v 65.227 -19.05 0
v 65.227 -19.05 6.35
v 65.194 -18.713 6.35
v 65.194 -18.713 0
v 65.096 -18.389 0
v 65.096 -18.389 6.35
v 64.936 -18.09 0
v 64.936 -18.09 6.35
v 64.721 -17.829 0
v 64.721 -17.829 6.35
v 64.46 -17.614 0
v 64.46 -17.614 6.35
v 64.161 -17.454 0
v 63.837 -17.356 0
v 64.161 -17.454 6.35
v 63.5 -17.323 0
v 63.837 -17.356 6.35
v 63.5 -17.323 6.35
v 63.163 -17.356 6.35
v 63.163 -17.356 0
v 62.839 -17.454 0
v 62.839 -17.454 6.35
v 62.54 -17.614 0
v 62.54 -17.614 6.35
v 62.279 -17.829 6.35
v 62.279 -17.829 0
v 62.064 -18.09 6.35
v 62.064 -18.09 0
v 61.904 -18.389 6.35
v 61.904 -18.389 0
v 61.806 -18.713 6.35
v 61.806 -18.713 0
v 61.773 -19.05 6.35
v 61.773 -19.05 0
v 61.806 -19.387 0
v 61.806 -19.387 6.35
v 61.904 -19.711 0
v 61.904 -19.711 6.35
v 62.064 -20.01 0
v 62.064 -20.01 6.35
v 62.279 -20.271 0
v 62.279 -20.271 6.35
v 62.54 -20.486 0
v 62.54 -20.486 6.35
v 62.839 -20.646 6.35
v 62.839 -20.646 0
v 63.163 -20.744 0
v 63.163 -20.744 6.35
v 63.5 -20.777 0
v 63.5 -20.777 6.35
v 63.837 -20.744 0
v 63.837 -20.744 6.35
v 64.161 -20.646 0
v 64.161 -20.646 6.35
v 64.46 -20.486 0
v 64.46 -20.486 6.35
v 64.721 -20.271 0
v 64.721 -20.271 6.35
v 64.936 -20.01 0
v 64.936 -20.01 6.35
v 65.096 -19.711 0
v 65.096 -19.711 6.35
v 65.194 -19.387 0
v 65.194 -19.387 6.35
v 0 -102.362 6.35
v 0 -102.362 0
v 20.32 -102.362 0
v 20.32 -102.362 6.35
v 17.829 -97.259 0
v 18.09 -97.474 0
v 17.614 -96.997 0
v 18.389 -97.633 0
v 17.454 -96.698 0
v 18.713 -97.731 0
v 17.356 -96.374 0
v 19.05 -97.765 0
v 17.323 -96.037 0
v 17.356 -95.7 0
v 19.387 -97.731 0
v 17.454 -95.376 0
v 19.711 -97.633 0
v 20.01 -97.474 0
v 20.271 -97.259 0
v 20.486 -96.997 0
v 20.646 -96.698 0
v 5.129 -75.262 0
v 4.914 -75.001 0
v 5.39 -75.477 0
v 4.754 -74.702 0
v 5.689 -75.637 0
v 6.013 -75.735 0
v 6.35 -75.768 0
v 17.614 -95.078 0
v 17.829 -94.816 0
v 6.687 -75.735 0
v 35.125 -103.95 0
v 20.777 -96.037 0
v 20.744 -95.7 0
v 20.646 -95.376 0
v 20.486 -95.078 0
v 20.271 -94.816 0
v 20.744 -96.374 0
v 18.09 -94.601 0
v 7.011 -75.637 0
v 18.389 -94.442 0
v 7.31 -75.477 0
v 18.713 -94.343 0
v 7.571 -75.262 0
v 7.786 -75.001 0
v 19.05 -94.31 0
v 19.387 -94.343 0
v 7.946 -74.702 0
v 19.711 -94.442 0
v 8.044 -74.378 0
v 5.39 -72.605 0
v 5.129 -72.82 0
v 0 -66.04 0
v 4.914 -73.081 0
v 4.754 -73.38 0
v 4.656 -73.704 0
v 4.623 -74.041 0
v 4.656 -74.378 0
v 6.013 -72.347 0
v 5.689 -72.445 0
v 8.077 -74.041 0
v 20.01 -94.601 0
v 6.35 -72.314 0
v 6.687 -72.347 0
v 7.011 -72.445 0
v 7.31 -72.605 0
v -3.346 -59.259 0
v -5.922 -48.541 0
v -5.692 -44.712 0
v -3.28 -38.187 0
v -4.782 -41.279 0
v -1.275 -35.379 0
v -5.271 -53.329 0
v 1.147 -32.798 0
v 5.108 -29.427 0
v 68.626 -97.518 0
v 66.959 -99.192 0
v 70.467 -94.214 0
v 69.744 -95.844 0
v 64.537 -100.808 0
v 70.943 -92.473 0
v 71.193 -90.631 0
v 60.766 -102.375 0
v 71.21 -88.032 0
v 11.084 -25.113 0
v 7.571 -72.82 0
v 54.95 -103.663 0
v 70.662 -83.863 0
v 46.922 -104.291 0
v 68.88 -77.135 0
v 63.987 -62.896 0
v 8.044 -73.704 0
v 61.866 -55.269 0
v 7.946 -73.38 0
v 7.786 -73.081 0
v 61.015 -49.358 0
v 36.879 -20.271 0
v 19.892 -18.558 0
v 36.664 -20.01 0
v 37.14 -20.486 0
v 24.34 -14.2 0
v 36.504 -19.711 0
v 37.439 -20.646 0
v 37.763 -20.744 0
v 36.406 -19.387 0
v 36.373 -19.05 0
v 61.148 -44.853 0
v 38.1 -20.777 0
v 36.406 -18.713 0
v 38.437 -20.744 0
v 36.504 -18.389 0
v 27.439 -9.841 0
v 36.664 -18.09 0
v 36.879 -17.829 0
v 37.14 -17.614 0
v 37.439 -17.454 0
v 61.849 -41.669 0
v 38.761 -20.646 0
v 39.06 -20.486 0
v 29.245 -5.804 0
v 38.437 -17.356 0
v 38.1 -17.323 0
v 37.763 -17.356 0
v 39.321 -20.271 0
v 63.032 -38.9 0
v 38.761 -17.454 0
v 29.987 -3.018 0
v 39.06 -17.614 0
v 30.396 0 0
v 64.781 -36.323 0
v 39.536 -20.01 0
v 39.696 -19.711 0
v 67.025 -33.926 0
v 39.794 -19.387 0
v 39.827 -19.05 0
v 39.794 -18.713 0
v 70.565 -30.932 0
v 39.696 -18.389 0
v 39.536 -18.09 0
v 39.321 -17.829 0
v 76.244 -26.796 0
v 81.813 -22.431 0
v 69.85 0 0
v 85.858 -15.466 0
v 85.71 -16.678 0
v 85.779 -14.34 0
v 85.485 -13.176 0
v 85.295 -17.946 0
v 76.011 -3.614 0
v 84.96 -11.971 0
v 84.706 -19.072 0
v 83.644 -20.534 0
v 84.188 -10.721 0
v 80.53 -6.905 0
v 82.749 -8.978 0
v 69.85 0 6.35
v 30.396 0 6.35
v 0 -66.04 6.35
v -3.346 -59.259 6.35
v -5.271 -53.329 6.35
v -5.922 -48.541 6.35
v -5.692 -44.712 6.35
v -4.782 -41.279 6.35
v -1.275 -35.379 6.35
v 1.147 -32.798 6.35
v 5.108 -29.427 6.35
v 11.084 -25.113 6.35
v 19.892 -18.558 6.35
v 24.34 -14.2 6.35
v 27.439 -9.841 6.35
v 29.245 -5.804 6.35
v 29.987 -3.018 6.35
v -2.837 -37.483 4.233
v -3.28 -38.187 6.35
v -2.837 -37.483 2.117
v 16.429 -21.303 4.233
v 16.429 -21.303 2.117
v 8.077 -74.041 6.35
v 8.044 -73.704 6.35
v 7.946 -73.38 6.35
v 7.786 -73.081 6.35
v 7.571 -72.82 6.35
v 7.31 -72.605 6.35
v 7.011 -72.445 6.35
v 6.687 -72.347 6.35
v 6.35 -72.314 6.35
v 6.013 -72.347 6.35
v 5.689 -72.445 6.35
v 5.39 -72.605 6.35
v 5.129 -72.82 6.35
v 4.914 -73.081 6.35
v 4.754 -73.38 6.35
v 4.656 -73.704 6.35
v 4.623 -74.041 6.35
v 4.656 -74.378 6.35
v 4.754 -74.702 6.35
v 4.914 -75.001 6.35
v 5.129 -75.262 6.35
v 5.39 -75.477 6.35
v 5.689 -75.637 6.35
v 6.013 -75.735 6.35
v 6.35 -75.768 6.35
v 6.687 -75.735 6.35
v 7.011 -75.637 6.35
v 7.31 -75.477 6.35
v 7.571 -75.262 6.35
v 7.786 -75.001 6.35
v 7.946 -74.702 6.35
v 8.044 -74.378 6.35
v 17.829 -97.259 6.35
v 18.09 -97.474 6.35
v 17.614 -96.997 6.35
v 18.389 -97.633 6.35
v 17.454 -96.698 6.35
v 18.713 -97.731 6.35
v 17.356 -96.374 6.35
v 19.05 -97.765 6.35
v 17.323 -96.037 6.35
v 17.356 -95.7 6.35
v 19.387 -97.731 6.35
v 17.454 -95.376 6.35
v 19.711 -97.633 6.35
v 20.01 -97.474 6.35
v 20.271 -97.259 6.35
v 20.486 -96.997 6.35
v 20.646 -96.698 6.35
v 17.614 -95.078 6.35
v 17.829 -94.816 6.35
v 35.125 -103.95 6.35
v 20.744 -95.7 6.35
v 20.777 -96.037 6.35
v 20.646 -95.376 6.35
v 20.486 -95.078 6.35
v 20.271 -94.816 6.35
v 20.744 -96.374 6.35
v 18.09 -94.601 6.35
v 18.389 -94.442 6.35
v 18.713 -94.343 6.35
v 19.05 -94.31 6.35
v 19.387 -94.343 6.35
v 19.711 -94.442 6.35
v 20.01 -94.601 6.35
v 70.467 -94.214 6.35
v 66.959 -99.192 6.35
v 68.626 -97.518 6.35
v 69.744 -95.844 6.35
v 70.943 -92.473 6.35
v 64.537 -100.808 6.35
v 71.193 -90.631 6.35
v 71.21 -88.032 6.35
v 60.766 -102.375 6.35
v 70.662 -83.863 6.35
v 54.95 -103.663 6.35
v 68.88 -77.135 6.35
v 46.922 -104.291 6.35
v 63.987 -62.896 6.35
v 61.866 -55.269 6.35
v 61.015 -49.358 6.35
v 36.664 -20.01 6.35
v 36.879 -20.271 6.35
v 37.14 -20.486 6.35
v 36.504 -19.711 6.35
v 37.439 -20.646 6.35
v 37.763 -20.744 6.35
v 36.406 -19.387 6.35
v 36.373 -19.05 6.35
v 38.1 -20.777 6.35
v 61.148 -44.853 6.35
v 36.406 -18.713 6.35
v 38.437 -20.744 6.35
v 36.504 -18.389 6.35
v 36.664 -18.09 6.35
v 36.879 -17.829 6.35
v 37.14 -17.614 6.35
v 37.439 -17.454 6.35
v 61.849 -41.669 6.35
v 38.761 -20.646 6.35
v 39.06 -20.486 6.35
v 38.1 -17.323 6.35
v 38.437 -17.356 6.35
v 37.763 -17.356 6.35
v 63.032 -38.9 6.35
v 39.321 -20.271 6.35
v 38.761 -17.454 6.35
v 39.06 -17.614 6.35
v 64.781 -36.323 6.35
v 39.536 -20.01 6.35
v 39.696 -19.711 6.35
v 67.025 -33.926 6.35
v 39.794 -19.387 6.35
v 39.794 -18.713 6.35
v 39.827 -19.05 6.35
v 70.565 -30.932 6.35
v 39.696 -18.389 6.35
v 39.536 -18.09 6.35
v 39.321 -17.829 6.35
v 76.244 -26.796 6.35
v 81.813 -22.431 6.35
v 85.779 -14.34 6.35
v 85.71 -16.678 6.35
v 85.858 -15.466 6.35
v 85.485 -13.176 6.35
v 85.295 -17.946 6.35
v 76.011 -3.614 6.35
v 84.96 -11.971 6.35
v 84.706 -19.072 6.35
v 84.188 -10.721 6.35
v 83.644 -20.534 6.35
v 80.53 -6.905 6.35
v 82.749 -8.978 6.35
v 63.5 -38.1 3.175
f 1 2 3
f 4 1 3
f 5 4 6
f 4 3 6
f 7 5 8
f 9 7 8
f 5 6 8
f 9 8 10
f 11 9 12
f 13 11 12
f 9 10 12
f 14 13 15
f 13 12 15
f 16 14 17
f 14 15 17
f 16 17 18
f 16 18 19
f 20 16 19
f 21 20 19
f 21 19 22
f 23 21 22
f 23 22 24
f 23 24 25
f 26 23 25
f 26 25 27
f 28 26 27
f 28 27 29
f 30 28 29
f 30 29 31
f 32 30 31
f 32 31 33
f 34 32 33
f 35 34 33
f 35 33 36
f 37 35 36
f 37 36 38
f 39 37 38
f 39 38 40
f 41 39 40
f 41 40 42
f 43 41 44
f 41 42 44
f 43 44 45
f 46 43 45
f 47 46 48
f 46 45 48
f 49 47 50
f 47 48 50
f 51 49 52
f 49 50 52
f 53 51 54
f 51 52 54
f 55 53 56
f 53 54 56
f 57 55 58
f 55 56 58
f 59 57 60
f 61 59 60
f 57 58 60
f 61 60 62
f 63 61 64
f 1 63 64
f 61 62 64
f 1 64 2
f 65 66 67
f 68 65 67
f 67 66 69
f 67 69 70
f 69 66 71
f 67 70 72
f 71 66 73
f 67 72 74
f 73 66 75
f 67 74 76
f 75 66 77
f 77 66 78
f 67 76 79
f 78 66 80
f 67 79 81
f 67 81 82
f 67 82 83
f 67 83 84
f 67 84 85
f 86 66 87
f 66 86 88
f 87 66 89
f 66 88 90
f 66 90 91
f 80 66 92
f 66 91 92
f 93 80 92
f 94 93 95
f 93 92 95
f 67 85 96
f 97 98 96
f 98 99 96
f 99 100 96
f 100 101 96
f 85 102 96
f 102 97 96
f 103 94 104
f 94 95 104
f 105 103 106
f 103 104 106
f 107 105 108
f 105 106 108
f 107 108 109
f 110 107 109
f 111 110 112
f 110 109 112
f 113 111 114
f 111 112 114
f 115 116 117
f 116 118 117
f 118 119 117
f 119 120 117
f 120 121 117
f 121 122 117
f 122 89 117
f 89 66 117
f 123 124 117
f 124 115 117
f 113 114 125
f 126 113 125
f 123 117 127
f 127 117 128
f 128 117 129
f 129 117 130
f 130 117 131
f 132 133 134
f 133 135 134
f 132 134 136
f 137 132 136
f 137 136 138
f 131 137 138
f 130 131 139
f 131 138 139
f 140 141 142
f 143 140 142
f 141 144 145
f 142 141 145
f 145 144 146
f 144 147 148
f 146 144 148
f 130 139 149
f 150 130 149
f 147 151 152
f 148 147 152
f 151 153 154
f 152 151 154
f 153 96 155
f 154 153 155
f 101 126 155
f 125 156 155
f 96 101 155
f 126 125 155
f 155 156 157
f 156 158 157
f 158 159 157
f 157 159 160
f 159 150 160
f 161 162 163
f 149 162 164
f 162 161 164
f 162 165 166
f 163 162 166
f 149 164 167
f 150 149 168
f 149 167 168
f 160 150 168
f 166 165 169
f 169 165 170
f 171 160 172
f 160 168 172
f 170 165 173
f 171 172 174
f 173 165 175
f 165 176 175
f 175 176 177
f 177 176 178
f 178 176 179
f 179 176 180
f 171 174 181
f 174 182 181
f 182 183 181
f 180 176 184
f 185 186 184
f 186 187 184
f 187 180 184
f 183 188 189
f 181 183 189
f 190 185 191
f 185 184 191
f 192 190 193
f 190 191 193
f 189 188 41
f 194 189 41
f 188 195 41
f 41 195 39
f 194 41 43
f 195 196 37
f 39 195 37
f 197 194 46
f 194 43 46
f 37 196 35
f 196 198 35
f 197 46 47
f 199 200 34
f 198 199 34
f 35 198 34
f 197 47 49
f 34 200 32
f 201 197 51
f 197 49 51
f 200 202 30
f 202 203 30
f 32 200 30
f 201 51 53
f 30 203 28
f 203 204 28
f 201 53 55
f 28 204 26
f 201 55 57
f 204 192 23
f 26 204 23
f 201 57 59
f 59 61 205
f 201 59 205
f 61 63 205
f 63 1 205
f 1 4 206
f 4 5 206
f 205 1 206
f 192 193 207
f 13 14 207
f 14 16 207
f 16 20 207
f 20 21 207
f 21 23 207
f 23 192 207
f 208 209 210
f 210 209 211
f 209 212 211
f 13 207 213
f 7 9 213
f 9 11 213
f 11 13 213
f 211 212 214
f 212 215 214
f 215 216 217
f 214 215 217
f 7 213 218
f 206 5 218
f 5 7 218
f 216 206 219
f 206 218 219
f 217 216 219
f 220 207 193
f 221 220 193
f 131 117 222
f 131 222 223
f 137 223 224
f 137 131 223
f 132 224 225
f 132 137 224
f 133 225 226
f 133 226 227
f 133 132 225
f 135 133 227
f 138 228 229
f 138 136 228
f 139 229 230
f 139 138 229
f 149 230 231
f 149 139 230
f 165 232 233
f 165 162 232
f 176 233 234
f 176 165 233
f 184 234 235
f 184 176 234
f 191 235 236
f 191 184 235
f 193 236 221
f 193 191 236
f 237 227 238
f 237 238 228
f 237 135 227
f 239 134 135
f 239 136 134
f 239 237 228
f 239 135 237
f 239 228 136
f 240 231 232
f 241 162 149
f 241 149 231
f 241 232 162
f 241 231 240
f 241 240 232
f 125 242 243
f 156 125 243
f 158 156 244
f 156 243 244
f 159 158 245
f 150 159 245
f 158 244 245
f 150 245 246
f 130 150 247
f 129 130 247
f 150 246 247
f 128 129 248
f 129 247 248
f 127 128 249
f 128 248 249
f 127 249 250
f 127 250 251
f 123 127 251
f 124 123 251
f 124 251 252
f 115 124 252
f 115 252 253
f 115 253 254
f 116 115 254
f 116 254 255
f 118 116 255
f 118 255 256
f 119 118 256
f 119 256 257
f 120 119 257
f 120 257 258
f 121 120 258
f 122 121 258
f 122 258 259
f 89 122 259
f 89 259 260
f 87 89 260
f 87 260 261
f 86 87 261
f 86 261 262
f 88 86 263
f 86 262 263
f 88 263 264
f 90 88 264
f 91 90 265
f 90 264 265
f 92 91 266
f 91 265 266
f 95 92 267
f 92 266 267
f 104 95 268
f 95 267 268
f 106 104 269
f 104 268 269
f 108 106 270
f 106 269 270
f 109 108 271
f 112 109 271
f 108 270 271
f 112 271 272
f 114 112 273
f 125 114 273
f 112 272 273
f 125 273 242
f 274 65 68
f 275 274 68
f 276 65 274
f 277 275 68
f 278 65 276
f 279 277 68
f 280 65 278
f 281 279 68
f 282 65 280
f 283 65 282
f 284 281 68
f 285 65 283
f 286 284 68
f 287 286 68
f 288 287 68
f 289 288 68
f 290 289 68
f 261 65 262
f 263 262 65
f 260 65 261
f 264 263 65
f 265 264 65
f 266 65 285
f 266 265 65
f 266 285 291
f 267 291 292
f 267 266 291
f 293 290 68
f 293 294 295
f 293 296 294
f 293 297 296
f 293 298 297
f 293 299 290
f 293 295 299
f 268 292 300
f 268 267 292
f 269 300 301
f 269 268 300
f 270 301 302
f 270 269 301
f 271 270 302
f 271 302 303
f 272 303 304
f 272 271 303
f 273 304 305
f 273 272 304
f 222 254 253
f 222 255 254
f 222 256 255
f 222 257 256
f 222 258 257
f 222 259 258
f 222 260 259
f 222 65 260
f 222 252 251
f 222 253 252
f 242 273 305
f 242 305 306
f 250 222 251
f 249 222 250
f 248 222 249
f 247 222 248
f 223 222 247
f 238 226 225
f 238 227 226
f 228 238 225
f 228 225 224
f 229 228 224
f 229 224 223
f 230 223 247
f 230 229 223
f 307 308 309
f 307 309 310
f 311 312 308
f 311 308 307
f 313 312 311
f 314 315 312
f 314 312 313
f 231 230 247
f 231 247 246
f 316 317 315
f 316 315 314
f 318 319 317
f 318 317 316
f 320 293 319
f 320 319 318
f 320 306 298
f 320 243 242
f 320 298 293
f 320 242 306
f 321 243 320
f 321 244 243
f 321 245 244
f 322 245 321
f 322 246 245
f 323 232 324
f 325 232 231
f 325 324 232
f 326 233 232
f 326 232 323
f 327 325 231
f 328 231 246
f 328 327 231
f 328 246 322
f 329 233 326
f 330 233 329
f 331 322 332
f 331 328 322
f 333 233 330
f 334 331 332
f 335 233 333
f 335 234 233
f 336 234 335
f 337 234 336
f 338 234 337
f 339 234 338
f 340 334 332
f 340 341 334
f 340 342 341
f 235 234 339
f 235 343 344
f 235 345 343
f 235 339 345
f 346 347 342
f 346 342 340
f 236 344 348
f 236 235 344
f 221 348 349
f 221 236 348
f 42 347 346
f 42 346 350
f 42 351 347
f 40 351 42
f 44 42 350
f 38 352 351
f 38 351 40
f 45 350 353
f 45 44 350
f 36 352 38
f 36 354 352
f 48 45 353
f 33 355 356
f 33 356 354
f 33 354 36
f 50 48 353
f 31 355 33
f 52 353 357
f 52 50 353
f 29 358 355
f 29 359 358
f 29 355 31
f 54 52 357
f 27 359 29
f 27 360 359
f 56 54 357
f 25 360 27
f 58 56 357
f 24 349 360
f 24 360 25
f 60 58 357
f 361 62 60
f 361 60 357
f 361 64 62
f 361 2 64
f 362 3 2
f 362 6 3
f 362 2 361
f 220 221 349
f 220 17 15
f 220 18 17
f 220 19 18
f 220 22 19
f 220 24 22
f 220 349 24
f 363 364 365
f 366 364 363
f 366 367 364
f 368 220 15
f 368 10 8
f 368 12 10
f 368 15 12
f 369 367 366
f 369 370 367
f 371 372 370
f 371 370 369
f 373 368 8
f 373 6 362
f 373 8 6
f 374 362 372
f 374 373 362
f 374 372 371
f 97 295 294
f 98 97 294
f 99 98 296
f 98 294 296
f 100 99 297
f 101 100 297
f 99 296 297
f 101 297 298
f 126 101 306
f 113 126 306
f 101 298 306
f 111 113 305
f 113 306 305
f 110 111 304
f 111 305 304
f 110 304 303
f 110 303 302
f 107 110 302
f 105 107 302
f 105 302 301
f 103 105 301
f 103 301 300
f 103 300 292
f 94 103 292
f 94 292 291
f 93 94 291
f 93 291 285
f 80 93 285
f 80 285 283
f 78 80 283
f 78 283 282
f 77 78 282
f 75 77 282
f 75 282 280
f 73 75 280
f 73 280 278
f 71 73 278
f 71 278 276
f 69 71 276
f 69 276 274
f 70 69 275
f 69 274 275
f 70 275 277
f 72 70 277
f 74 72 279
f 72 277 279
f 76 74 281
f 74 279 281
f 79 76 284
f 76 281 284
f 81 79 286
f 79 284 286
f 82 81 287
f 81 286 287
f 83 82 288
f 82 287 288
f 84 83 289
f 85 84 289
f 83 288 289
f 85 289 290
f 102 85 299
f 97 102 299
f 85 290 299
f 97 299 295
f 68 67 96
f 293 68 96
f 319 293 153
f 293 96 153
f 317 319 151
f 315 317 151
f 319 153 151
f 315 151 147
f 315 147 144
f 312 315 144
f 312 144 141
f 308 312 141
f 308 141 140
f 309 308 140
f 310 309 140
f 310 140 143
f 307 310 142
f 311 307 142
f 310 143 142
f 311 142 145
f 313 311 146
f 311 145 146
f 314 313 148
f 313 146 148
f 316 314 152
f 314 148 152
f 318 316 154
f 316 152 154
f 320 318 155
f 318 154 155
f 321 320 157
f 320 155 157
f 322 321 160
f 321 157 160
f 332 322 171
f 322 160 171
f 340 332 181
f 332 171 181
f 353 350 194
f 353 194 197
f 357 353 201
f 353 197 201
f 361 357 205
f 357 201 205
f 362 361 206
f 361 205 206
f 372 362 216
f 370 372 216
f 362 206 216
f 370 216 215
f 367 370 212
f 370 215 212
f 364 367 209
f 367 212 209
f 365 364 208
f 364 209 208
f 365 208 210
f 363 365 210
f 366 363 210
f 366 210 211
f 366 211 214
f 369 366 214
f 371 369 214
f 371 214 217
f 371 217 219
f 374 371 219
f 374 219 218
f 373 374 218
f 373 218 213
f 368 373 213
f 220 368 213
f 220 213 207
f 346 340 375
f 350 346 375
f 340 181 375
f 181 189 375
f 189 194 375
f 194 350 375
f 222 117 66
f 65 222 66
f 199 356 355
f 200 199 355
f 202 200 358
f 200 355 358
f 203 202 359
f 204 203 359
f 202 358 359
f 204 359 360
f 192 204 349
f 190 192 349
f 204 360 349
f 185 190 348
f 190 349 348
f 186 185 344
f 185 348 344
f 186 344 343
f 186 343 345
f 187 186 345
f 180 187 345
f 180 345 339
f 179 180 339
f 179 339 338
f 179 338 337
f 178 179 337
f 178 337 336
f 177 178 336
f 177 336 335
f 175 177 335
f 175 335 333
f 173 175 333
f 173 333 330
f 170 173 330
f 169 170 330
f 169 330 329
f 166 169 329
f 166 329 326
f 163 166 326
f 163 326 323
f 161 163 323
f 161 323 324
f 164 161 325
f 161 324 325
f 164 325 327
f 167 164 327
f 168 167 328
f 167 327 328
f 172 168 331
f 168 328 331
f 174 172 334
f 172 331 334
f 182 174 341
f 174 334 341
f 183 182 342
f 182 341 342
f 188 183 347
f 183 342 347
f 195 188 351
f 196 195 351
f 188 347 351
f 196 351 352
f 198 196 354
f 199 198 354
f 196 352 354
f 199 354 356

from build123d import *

# Parameters (mm, degrees)
BOSS_EXTRUDE1_DEPTH       = 6.35
TAP_DRILL_FOR_8_32_TAP1_D = 3.4544


# Read off the part's stored shape, not the designer's step: Boss-Extrude1
with BuildPart() as part:
    # Boss-Extrude1 outline → Boss-Extrude1 (new body)
    with BuildSketch(Plane.XY):
        with BuildLine():
            Line((0, -66.04), (0, -102.362))
            Line((0, -102.362), (20.32, -102.362))
            add(Edge.make_bspline(
                [(20.32, -102.362), (112.724526082, -115.037668854), (12.136897546, -33.992901458), (105.278452179, -19.075705978), (69.85, 0)],
                knots=[0, 0, 0, 0, 0.643707462, 1, 1, 1, 1], degree=3))
            Line((69.85, 0), (30.395783043, 0))
            add(Edge.make_bspline(
                [(0, -66.04), (-23.02244586, -25.459793903), (28.212204822, -29.698834111), (30.395783043, 0)],
                knots=[0, 0, 0, 0, 1, 1, 1, 1], degree=3))
        make_face()
    extrude(amount=BOSS_EXTRUDE1_DEPTH)

    # Tap Drill for #8-32 Tap1 (through all)
    with Locations(Plane(origin=(0, 0, 0), x_dir=(-1, 0, 0), z_dir=(0, 0, -1))):
        with Locations((-63.5, -19.05), (-38.1, -19.05), (-6.35, -74.041), (-19.05, -96.0374)):
            Hole(TAP_DRILL_FOR_8_32_TAP1_D / 2)


solid = part.part
